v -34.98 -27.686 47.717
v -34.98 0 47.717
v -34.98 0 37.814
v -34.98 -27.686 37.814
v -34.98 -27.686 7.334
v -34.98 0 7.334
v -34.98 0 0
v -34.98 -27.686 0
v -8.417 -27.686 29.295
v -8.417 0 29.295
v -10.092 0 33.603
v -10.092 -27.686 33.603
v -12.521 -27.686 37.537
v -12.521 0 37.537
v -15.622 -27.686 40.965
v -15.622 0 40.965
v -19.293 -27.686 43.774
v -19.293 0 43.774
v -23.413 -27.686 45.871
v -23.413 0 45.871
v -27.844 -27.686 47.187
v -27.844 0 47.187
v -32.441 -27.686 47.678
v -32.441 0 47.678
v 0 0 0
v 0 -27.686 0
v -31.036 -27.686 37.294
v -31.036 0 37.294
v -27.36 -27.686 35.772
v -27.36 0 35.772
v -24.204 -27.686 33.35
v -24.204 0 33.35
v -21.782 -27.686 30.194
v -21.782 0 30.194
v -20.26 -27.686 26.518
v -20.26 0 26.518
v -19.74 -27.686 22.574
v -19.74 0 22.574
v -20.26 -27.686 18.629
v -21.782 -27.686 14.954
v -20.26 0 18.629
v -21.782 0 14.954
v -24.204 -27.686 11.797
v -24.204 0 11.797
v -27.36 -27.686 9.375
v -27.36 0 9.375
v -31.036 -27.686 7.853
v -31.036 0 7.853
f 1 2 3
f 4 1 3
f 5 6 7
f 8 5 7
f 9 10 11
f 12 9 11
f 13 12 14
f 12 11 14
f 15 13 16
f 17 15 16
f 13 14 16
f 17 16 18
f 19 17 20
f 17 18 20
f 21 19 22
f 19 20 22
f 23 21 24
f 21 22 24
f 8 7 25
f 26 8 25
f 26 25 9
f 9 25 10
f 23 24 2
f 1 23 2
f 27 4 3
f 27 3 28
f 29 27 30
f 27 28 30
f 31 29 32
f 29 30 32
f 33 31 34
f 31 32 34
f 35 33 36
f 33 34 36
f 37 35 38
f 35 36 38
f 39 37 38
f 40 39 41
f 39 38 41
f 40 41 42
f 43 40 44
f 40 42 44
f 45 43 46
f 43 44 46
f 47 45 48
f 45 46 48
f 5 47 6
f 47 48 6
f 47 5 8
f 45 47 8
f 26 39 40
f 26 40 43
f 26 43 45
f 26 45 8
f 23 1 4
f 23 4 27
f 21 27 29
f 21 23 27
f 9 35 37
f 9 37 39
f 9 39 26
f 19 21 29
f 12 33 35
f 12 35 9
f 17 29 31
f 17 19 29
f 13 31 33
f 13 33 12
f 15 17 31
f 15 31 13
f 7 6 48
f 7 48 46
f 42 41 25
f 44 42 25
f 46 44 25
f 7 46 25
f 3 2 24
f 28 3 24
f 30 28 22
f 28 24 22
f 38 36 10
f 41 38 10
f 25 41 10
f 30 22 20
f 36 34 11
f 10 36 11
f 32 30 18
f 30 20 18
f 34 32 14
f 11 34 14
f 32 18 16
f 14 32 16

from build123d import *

# Parameters (mm, degrees)
F1_DEPTH = 27.686


with BuildPart() as f1:
    # F0 (on Front) → F1 (new body)
    with BuildSketch(Plane.XZ):
        with BuildLine():
            Line((-34.980499, 7.33363), (-34.980499, 0))
            Line((-34.980499, 0), (0, 0))
            Line((0, 0), (-8.416646, 29.294888))
            ThreePointArc((-8.416646, 29.294888), (-17.393594, 42.452943), (-32.440795, 47.678049))
            Line((-32.440795, 47.678049), (-34.980499, 47.716875))
            Line((-34.980499, 47.716875), (-34.980499, 37.81363))
            ThreePointArc((-34.980499, 37.81363), (-24.204191, 33.349937), (-19.740499, 22.57363))
            ThreePointArc((-19.740499, 22.57363), (-24.204191, 11.797322), (-34.980499, 7.33363))
        make_face()
    extrude(amount=F1_DEPTH)


solid = f1.part
